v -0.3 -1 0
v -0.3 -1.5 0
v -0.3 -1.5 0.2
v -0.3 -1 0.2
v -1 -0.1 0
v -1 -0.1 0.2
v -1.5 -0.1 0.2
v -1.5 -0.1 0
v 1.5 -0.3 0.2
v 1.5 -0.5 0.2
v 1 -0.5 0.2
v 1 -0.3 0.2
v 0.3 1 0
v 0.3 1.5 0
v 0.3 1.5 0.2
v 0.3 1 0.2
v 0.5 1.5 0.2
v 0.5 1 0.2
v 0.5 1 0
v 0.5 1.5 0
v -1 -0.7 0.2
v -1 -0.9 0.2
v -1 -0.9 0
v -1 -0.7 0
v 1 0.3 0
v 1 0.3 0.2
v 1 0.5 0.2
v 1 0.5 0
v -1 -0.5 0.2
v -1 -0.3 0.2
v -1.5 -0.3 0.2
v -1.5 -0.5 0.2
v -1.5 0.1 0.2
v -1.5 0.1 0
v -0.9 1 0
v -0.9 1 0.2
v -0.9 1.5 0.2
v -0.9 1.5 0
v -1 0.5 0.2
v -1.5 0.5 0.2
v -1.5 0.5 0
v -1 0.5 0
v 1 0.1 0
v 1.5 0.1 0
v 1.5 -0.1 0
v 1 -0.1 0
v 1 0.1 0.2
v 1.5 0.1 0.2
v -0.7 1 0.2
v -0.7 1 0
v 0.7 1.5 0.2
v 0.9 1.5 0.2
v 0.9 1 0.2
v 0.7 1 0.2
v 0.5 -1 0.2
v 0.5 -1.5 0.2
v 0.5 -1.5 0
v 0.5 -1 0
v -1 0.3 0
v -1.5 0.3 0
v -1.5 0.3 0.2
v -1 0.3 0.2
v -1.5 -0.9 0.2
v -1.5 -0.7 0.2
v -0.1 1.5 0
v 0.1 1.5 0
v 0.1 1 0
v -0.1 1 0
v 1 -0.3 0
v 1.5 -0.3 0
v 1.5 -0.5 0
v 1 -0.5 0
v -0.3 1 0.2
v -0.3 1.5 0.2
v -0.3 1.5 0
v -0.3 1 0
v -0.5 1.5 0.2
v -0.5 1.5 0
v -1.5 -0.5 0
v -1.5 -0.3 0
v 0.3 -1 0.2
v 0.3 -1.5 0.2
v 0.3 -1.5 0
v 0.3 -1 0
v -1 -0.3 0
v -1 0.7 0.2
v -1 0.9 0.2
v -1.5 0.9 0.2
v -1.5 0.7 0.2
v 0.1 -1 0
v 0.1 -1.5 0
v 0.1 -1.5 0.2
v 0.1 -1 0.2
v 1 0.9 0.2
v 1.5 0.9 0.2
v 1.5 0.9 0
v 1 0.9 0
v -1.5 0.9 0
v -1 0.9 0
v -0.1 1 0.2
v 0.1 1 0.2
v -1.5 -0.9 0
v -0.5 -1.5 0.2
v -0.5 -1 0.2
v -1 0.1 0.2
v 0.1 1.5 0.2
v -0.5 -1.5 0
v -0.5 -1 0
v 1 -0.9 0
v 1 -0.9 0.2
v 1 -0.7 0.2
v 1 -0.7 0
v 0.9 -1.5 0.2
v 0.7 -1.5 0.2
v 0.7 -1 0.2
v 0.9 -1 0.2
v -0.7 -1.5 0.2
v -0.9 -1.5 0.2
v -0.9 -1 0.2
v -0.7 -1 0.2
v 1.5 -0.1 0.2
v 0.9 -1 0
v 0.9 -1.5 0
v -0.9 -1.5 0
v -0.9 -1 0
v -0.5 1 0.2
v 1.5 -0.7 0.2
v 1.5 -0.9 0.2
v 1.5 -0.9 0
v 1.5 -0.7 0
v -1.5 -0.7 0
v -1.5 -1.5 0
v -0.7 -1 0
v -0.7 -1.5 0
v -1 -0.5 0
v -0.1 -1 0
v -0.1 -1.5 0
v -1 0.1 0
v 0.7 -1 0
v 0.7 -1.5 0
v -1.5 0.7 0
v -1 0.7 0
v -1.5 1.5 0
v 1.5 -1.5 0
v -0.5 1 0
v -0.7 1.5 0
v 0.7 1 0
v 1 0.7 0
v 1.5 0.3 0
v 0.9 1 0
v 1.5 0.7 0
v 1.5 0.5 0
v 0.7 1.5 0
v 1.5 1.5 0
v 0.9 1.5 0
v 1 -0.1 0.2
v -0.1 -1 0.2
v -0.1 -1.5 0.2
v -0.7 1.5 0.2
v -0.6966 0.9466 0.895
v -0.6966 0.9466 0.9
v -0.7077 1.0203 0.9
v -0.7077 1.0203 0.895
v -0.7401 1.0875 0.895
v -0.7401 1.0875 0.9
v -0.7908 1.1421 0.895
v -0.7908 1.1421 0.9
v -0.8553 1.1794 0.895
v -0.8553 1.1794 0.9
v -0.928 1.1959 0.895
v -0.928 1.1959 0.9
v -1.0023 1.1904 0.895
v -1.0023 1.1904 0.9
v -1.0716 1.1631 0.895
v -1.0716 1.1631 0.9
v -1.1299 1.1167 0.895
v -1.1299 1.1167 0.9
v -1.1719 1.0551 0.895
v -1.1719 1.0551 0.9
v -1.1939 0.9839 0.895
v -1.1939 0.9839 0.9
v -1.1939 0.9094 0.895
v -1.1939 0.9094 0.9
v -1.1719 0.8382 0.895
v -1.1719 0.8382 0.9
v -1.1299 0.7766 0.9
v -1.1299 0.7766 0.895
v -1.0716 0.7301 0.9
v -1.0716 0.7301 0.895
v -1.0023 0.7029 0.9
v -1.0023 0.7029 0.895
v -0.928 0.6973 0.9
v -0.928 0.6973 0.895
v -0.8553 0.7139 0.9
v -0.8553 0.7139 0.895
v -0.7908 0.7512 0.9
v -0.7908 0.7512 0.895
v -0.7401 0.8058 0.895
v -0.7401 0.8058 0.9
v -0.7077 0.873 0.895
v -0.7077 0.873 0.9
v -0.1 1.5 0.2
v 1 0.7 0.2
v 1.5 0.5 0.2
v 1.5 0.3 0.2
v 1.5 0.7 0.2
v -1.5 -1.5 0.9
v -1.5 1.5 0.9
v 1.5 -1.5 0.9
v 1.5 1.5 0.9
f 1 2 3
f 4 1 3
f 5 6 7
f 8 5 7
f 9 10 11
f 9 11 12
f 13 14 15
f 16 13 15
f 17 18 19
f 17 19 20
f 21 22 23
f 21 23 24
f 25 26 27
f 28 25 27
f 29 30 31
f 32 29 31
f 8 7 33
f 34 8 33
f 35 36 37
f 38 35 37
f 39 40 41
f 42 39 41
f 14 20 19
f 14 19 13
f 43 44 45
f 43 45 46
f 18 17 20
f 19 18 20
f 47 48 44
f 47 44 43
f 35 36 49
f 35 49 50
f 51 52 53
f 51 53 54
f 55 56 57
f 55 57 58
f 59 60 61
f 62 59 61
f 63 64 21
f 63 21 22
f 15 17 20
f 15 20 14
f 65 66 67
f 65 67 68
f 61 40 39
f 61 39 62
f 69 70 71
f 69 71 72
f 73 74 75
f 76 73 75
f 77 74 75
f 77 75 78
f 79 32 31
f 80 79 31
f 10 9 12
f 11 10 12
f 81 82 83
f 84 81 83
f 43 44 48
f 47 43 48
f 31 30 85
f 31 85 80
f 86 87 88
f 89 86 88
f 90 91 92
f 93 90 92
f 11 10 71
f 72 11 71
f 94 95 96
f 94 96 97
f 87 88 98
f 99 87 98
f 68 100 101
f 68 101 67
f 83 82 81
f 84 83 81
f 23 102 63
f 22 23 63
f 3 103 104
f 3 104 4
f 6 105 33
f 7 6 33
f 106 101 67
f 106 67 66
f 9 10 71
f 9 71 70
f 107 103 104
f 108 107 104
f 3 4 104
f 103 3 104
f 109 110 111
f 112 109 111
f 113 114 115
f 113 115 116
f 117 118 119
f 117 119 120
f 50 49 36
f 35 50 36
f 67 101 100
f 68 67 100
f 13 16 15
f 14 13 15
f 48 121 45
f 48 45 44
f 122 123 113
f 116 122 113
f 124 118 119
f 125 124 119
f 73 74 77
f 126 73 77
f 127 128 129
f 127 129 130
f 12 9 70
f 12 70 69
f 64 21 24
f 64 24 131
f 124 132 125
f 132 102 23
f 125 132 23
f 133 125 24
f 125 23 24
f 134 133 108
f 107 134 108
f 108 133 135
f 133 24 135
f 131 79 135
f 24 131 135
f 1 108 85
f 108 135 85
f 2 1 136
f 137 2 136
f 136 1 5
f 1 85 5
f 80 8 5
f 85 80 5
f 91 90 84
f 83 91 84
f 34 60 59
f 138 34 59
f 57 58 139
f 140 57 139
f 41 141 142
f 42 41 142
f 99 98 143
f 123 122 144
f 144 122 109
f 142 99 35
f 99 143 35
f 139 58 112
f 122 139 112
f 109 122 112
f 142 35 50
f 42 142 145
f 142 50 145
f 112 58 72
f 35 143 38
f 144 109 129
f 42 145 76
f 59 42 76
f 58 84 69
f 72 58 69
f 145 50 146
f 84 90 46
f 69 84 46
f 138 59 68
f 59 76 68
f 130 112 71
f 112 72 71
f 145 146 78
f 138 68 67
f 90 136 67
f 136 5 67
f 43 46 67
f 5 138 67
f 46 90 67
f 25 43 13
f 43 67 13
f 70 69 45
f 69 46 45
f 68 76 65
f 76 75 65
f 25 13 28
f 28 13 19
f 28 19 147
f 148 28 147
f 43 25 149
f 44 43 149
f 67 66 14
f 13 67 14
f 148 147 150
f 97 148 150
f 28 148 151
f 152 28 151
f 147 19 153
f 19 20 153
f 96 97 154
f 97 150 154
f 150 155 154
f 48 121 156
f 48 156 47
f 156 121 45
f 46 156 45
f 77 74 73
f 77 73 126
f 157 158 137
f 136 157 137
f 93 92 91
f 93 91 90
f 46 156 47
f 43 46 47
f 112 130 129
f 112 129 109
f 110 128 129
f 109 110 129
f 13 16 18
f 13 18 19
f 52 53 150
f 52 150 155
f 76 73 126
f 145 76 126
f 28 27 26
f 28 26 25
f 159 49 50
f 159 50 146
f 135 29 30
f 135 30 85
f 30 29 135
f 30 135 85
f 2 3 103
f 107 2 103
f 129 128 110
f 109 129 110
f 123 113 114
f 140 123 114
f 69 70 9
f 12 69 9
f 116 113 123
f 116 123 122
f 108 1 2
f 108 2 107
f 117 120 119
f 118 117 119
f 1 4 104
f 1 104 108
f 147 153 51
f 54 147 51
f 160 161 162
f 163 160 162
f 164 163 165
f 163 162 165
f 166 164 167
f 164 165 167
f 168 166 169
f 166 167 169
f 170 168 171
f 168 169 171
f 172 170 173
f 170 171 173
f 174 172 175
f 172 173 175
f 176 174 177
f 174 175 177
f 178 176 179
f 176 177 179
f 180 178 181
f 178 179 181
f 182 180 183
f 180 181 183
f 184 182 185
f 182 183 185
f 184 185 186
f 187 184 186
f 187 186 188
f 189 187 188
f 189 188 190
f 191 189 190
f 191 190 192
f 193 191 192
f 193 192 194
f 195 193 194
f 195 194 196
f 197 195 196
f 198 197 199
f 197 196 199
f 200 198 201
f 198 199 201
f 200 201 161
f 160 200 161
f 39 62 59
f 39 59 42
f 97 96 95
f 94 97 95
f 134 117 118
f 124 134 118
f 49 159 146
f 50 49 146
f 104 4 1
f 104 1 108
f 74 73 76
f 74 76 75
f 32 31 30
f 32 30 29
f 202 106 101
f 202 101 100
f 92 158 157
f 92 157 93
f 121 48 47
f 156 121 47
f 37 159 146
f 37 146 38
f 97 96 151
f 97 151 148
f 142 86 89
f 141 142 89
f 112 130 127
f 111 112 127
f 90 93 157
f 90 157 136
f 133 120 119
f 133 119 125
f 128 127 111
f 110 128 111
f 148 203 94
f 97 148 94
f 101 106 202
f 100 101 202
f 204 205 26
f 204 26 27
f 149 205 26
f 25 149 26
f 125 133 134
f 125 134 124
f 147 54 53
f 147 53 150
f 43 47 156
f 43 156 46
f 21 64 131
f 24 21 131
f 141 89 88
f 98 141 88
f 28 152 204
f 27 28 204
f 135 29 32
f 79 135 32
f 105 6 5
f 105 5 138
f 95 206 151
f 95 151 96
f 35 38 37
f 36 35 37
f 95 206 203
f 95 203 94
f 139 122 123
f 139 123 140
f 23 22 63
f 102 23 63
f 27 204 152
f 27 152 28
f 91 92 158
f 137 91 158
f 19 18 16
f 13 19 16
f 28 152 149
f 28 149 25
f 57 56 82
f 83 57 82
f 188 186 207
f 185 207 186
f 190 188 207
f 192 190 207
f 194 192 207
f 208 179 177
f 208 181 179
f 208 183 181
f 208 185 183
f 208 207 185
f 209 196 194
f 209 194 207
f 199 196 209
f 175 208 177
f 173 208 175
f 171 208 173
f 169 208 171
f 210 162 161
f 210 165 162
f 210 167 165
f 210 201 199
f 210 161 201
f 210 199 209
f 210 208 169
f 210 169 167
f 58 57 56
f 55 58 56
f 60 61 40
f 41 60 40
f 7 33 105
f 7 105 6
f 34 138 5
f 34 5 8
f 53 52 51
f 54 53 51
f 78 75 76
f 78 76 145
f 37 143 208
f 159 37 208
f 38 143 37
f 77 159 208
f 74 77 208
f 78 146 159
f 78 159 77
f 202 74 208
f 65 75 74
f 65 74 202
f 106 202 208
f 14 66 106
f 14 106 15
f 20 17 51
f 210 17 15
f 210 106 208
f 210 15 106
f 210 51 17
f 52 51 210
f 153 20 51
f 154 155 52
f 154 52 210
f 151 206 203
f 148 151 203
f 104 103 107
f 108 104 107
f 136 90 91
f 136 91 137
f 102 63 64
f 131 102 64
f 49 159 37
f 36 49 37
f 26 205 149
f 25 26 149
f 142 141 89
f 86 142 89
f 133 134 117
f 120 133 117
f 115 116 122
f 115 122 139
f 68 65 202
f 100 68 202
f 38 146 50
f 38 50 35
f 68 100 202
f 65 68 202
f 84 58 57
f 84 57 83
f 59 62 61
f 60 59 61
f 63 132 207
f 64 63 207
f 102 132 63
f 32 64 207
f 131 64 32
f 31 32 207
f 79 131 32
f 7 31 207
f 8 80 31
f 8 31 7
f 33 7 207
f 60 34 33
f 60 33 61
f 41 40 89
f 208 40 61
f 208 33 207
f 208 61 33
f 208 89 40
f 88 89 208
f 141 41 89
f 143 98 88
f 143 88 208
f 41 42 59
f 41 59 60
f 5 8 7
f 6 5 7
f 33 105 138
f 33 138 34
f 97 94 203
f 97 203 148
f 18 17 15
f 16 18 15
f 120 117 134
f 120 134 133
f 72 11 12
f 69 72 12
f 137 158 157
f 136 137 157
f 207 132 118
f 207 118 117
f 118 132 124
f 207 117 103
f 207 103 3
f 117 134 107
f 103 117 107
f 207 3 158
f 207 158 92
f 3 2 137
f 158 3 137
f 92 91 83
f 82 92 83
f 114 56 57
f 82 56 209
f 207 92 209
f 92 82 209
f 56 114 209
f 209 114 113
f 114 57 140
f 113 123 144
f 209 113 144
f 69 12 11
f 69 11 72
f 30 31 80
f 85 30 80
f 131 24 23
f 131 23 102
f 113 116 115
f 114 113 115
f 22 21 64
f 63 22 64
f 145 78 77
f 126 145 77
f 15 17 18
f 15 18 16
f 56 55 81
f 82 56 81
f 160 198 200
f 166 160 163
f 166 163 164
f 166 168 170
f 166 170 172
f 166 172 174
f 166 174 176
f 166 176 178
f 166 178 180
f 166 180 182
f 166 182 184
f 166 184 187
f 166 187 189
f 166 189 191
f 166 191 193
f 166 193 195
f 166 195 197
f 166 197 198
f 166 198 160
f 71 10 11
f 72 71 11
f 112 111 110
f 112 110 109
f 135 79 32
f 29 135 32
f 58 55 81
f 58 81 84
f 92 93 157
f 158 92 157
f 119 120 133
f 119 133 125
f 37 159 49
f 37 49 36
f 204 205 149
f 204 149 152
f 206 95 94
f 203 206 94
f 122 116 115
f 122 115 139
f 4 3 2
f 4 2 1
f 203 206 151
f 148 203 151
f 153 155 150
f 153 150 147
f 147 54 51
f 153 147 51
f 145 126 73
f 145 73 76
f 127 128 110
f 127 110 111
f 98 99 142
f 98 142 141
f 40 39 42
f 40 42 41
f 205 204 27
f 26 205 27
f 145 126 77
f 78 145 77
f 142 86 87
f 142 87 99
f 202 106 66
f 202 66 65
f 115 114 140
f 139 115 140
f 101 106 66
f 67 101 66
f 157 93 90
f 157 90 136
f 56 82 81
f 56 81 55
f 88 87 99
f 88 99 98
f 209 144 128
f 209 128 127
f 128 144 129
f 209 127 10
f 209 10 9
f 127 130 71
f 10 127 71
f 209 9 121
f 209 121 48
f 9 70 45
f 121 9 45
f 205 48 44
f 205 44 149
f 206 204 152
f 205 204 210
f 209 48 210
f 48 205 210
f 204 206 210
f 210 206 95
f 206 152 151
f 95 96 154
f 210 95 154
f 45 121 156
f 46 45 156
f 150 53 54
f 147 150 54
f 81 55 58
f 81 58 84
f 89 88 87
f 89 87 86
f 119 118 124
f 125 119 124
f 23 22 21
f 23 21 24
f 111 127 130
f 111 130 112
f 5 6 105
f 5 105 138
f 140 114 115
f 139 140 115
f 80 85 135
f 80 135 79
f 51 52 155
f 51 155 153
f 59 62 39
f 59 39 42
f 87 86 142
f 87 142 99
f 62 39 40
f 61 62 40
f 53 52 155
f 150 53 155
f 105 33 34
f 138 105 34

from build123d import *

# Parameters (mm, degrees)
SKETCH1_W              = 3
SKETCH1_H              = 3
BOSS_EXTRUDE1_DEPTH    = 0.9
SKETCH2_W              = 0.2
SKETCH2_H              = 0.2
CUT_EXTRUDE1_DEPTH     = 0.5
CIRPATTERN1_COUNT      = 4
SKETCH4_R              = 0.25
CUT_EXTRUDE2_DEPTH     = 0.005
SKETCH5_W              = 0.5
SKETCH5_H              = 0.2
BOSS_EXTRUDE2_DEPTH    = 0.2
BOSS_EXTRUDE2_2_DEPTH  = 0.2
BOSS_EXTRUDE2_3_DEPTH  = 0.2
BOSS_EXTRUDE2_4_DEPTH  = 0.2
BOSS_EXTRUDE2_5_DEPTH  = 0.2
SKETCH5_W_2            = 0.2
SKETCH5_H_2            = 0.5
BOSS_EXTRUDE2_6_DEPTH  = 0.2
BOSS_EXTRUDE2_7_DEPTH  = 0.2
BOSS_EXTRUDE2_8_DEPTH  = 0.2
BOSS_EXTRUDE2_9_DEPTH  = 0.2
BOSS_EXTRUDE2_10_DEPTH = 0.2
BOSS_EXTRUDE2_11_DEPTH = 0.2
BOSS_EXTRUDE2_12_DEPTH = 0.2
BOSS_EXTRUDE2_13_DEPTH = 0.2
BOSS_EXTRUDE2_14_DEPTH = 0.2
BOSS_EXTRUDE2_15_DEPTH = 0.2
BOSS_EXTRUDE2_16_DEPTH = 0.2
BOSS_EXTRUDE2_17_DEPTH = 0.2
BOSS_EXTRUDE2_18_DEPTH = 0.2
BOSS_EXTRUDE2_19_DEPTH = 0.2
BOSS_EXTRUDE2_20_DEPTH = 0.2


with BuildPart() as part:
    # Sketch1 → Boss-Extrude1 (new body)
    with BuildSketch(Plane.XY):
        Rectangle(SKETCH1_W, SKETCH1_H)
    extrude(amount=BOSS_EXTRUDE1_DEPTH)

    # Sketch2 → Cut-Extrude1 (cut)
    with BuildSketch(Plane(origin=(1.5, 0, 0), x_dir=(0, 0, -1), z_dir=(1, 0, 0))):
        with Locations((-0.1, -0.8)):
            Rectangle(SKETCH2_W, SKETCH2_H)
        with Locations((-0.1, -0.4)):
            Rectangle(SKETCH2_W, SKETCH2_H)
        with Locations((-0.1, 0)):
            Rectangle(SKETCH2_W, SKETCH2_H)
        with Locations((-0.1, 0.4)):
            Rectangle(SKETCH2_W, SKETCH2_H)
        with Locations((-0.1, 0.8)):
            Rectangle(SKETCH2_W, SKETCH2_H)
        with Locations((0.1, 0.8)):
            Rectangle(SKETCH2_W, SKETCH2_H)
        with Locations((0.1, 0.4)):
            Rectangle(SKETCH2_W, SKETCH2_H)
        with Locations((0.1, 0)):
            Rectangle(SKETCH2_W, SKETCH2_H)
        with Locations((0.1, -0.4)):
            Rectangle(SKETCH2_W, SKETCH2_H)
        with Locations((0.1, -0.8)):
            Rectangle(SKETCH2_W, SKETCH2_H)
    cut_extrude1 = extrude(amount=-CUT_EXTRUDE1_DEPTH, mode=Mode.SUBTRACT)

    # CirPattern1: Cut-Extrude1 ×4 about axis
    cirpattern1_axis = Axis((0, 0, 0), (0, 0, 1))
    for i in range(1, CIRPATTERN1_COUNT):
        add(cut_extrude1.rotate(cirpattern1_axis, i * 360 / CIRPATTERN1_COUNT), mode=Mode.SUBTRACT)

    # Sketch4 → Cut-Extrude2 (cut)
    with BuildSketch(Plane.XY.offset(0.9)):
        with Locations((-0.946643178, 0.946643178)):
            Circle(SKETCH4_R)
    extrude(amount=-CUT_EXTRUDE2_DEPTH, mode=Mode.SUBTRACT)


with BuildPart() as body_2:
    # Sketch5 → Boss-Extrude2 (new body)
    with BuildSketch(Plane(origin=(0, 0, 0.2), x_dir=(-1, 0, 0), z_dir=(0, 0, -1))):
        with Locations((-1.25, 0.8)):
            Rectangle(SKETCH5_W, SKETCH5_H)
    extrude(amount=BOSS_EXTRUDE2_DEPTH)


with BuildPart() as body_3:
    # Sketch5 → Boss-Extrude2 2 (new body)
    with BuildSketch(Plane(origin=(0, 0, 0.2), x_dir=(-1, 0, 0), z_dir=(0, 0, -1))):
        with Locations((-1.25, 0.4)):
            Rectangle(SKETCH5_W, SKETCH5_H)
    extrude(amount=BOSS_EXTRUDE2_2_DEPTH)


with BuildPart() as body_4:
    # Sketch5 → Boss-Extrude2 3 (new body)
    with BuildSketch(Plane(origin=(0, 0, 0.2), x_dir=(-1, 0, 0), z_dir=(0, 0, -1))):
        with Locations((-1.25, 0)):
            Rectangle(SKETCH5_W, SKETCH5_H)
    extrude(amount=BOSS_EXTRUDE2_3_DEPTH)


with BuildPart() as body_5:
    # Sketch5 → Boss-Extrude2 4 (new body)
    with BuildSketch(Plane(origin=(0, 0, 0.2), x_dir=(-1, 0, 0), z_dir=(0, 0, -1))):
        with Locations((-1.25, -0.4)):
            Rectangle(SKETCH5_W, SKETCH5_H)
    extrude(amount=BOSS_EXTRUDE2_4_DEPTH)


with BuildPart() as body_6:
    # Sketch5 → Boss-Extrude2 5 (new body)
    with BuildSketch(Plane(origin=(0, 0, 0.2), x_dir=(-1, 0, 0), z_dir=(0, 0, -1))):
        with Locations((-1.25, -0.8)):
            Rectangle(SKETCH5_W, SKETCH5_H)
    extrude(amount=BOSS_EXTRUDE2_5_DEPTH)


with BuildPart() as body_7:
    # Sketch5 → Boss-Extrude2 6 (new body)
    with BuildSketch(Plane(origin=(0, 0, 0.2), x_dir=(-1, 0, 0), z_dir=(0, 0, -1))):
        with Locations((-0.8, -1.25)):
            Rectangle(SKETCH5_W_2, SKETCH5_H_2)
    extrude(amount=BOSS_EXTRUDE2_6_DEPTH)


with BuildPart() as body_8:
    # Sketch5 → Boss-Extrude2 7 (new body)
    with BuildSketch(Plane(origin=(0, 0, 0.2), x_dir=(-1, 0, 0), z_dir=(0, 0, -1))):
        with Locations((-0.4, -1.25)):
            Rectangle(SKETCH5_W_2, SKETCH5_H_2)
    extrude(amount=BOSS_EXTRUDE2_7_DEPTH)


with BuildPart() as body_9:
    # Sketch5 → Boss-Extrude2 8 (new body)
    with BuildSketch(Plane(origin=(0, 0, 0.2), x_dir=(-1, 0, 0), z_dir=(0, 0, -1))):
        with Locations((0, -1.25)):
            Rectangle(SKETCH5_W_2, SKETCH5_H_2)
    extrude(amount=BOSS_EXTRUDE2_8_DEPTH)


with BuildPart() as body_10:
    # Sketch5 → Boss-Extrude2 9 (new body)
    with BuildSketch(Plane(origin=(0, 0, 0.2), x_dir=(-1, 0, 0), z_dir=(0, 0, -1))):
        with Locations((0.4, -1.25)):
            Rectangle(SKETCH5_W_2, SKETCH5_H_2)
    extrude(amount=BOSS_EXTRUDE2_9_DEPTH)


with BuildPart() as body_11:
    # Sketch5 → Boss-Extrude2 10 (new body)
    with BuildSketch(Plane(origin=(0, 0, 0.2), x_dir=(-1, 0, 0), z_dir=(0, 0, -1))):
        with Locations((0.8, -1.25)):
            Rectangle(SKETCH5_W_2, SKETCH5_H_2)
    extrude(amount=BOSS_EXTRUDE2_10_DEPTH)


with BuildPart() as body_12:
    # Sketch5 → Boss-Extrude2 11 (new body)
    with BuildSketch(Plane(origin=(0, 0, 0.2), x_dir=(-1, 0, 0), z_dir=(0, 0, -1))):
        with Locations((1.25, -0.8)):
            Rectangle(SKETCH5_W, SKETCH5_H)
    extrude(amount=BOSS_EXTRUDE2_11_DEPTH)


with BuildPart() as body_13:
    # Sketch5 → Boss-Extrude2 12 (new body)
    with BuildSketch(Plane(origin=(0, 0, 0.2), x_dir=(-1, 0, 0), z_dir=(0, 0, -1))):
        with Locations((1.25, -0.4)):
            Rectangle(SKETCH5_W, SKETCH5_H)
    extrude(amount=BOSS_EXTRUDE2_12_DEPTH)


with BuildPart() as body_14:
    # Sketch5 → Boss-Extrude2 13 (new body)
    with BuildSketch(Plane(origin=(0, 0, 0.2), x_dir=(-1, 0, 0), z_dir=(0, 0, -1))):
        with Locations((1.25, 0)):
            Rectangle(SKETCH5_W, SKETCH5_H)
    extrude(amount=BOSS_EXTRUDE2_13_DEPTH)


with BuildPart() as body_15:
    # Sketch5 → Boss-Extrude2 14 (new body)
    with BuildSketch(Plane(origin=(0, 0, 0.2), x_dir=(-1, 0, 0), z_dir=(0, 0, -1))):
        with Locations((1.25, 0.4)):
            Rectangle(SKETCH5_W, SKETCH5_H)
    extrude(amount=BOSS_EXTRUDE2_14_DEPTH)


with BuildPart() as body_16:
    # Sketch5 → Boss-Extrude2 15 (new body)
    with BuildSketch(Plane(origin=(0, 0, 0.2), x_dir=(-1, 0, 0), z_dir=(0, 0, -1))):
        with Locations((1.25, 0.8)):
            Rectangle(SKETCH5_W, SKETCH5_H)
    extrude(amount=BOSS_EXTRUDE2_15_DEPTH)


with BuildPart() as body_17:
    # Sketch5 → Boss-Extrude2 16 (new body)
    with BuildSketch(Plane(origin=(0, 0, 0.2), x_dir=(-1, 0, 0), z_dir=(0, 0, -1))):
        with Locations((0.8, 1.25)):
            Rectangle(SKETCH5_W_2, SKETCH5_H_2)
    extrude(amount=BOSS_EXTRUDE2_16_DEPTH)


with BuildPart() as body_18:
    # Sketch5 → Boss-Extrude2 17 (new body)
    with BuildSketch(Plane(origin=(0, 0, 0.2), x_dir=(-1, 0, 0), z_dir=(0, 0, -1))):
        with Locations((0.4, 1.25)):
            Rectangle(SKETCH5_W_2, SKETCH5_H_2)
    extrude(amount=BOSS_EXTRUDE2_17_DEPTH)


with BuildPart() as body_19:
    # Sketch5 → Boss-Extrude2 18 (new body)
    with BuildSketch(Plane(origin=(0, 0, 0.2), x_dir=(-1, 0, 0), z_dir=(0, 0, -1))):
        with Locations((0, 1.25)):
            Rectangle(SKETCH5_W_2, SKETCH5_H_2)
    extrude(amount=BOSS_EXTRUDE2_18_DEPTH)


with BuildPart() as body_20:
    # Sketch5 → Boss-Extrude2 19 (new body)
    with BuildSketch(Plane(origin=(0, 0, 0.2), x_dir=(-1, 0, 0), z_dir=(0, 0, -1))):
        with Locations((-0.4, 1.25)):
            Rectangle(SKETCH5_W_2, SKETCH5_H_2)
    extrude(amount=BOSS_EXTRUDE2_19_DEPTH)


with BuildPart() as body_21:
    # Sketch5 → Boss-Extrude2 20 (new body)
    with BuildSketch(Plane(origin=(0, 0, 0.2), x_dir=(-1, 0, 0), z_dir=(0, 0, -1))):
        with Locations((-0.8, 1.25)):
            Rectangle(SKETCH5_W_2, SKETCH5_H_2)
    extrude(amount=BOSS_EXTRUDE2_20_DEPTH)


solid = Compound([part.part, body_2.part, body_3.part, body_4.part, body_5.part, body_6.part, body_7.part, body_8.part, body_9.part, body_10.part, body_11.part, body_12.part, body_13.part, body_14.part, body_15.part, body_16.part, body_17.part, body_18.part, body_19.part, body_20.part, body_21.part])
